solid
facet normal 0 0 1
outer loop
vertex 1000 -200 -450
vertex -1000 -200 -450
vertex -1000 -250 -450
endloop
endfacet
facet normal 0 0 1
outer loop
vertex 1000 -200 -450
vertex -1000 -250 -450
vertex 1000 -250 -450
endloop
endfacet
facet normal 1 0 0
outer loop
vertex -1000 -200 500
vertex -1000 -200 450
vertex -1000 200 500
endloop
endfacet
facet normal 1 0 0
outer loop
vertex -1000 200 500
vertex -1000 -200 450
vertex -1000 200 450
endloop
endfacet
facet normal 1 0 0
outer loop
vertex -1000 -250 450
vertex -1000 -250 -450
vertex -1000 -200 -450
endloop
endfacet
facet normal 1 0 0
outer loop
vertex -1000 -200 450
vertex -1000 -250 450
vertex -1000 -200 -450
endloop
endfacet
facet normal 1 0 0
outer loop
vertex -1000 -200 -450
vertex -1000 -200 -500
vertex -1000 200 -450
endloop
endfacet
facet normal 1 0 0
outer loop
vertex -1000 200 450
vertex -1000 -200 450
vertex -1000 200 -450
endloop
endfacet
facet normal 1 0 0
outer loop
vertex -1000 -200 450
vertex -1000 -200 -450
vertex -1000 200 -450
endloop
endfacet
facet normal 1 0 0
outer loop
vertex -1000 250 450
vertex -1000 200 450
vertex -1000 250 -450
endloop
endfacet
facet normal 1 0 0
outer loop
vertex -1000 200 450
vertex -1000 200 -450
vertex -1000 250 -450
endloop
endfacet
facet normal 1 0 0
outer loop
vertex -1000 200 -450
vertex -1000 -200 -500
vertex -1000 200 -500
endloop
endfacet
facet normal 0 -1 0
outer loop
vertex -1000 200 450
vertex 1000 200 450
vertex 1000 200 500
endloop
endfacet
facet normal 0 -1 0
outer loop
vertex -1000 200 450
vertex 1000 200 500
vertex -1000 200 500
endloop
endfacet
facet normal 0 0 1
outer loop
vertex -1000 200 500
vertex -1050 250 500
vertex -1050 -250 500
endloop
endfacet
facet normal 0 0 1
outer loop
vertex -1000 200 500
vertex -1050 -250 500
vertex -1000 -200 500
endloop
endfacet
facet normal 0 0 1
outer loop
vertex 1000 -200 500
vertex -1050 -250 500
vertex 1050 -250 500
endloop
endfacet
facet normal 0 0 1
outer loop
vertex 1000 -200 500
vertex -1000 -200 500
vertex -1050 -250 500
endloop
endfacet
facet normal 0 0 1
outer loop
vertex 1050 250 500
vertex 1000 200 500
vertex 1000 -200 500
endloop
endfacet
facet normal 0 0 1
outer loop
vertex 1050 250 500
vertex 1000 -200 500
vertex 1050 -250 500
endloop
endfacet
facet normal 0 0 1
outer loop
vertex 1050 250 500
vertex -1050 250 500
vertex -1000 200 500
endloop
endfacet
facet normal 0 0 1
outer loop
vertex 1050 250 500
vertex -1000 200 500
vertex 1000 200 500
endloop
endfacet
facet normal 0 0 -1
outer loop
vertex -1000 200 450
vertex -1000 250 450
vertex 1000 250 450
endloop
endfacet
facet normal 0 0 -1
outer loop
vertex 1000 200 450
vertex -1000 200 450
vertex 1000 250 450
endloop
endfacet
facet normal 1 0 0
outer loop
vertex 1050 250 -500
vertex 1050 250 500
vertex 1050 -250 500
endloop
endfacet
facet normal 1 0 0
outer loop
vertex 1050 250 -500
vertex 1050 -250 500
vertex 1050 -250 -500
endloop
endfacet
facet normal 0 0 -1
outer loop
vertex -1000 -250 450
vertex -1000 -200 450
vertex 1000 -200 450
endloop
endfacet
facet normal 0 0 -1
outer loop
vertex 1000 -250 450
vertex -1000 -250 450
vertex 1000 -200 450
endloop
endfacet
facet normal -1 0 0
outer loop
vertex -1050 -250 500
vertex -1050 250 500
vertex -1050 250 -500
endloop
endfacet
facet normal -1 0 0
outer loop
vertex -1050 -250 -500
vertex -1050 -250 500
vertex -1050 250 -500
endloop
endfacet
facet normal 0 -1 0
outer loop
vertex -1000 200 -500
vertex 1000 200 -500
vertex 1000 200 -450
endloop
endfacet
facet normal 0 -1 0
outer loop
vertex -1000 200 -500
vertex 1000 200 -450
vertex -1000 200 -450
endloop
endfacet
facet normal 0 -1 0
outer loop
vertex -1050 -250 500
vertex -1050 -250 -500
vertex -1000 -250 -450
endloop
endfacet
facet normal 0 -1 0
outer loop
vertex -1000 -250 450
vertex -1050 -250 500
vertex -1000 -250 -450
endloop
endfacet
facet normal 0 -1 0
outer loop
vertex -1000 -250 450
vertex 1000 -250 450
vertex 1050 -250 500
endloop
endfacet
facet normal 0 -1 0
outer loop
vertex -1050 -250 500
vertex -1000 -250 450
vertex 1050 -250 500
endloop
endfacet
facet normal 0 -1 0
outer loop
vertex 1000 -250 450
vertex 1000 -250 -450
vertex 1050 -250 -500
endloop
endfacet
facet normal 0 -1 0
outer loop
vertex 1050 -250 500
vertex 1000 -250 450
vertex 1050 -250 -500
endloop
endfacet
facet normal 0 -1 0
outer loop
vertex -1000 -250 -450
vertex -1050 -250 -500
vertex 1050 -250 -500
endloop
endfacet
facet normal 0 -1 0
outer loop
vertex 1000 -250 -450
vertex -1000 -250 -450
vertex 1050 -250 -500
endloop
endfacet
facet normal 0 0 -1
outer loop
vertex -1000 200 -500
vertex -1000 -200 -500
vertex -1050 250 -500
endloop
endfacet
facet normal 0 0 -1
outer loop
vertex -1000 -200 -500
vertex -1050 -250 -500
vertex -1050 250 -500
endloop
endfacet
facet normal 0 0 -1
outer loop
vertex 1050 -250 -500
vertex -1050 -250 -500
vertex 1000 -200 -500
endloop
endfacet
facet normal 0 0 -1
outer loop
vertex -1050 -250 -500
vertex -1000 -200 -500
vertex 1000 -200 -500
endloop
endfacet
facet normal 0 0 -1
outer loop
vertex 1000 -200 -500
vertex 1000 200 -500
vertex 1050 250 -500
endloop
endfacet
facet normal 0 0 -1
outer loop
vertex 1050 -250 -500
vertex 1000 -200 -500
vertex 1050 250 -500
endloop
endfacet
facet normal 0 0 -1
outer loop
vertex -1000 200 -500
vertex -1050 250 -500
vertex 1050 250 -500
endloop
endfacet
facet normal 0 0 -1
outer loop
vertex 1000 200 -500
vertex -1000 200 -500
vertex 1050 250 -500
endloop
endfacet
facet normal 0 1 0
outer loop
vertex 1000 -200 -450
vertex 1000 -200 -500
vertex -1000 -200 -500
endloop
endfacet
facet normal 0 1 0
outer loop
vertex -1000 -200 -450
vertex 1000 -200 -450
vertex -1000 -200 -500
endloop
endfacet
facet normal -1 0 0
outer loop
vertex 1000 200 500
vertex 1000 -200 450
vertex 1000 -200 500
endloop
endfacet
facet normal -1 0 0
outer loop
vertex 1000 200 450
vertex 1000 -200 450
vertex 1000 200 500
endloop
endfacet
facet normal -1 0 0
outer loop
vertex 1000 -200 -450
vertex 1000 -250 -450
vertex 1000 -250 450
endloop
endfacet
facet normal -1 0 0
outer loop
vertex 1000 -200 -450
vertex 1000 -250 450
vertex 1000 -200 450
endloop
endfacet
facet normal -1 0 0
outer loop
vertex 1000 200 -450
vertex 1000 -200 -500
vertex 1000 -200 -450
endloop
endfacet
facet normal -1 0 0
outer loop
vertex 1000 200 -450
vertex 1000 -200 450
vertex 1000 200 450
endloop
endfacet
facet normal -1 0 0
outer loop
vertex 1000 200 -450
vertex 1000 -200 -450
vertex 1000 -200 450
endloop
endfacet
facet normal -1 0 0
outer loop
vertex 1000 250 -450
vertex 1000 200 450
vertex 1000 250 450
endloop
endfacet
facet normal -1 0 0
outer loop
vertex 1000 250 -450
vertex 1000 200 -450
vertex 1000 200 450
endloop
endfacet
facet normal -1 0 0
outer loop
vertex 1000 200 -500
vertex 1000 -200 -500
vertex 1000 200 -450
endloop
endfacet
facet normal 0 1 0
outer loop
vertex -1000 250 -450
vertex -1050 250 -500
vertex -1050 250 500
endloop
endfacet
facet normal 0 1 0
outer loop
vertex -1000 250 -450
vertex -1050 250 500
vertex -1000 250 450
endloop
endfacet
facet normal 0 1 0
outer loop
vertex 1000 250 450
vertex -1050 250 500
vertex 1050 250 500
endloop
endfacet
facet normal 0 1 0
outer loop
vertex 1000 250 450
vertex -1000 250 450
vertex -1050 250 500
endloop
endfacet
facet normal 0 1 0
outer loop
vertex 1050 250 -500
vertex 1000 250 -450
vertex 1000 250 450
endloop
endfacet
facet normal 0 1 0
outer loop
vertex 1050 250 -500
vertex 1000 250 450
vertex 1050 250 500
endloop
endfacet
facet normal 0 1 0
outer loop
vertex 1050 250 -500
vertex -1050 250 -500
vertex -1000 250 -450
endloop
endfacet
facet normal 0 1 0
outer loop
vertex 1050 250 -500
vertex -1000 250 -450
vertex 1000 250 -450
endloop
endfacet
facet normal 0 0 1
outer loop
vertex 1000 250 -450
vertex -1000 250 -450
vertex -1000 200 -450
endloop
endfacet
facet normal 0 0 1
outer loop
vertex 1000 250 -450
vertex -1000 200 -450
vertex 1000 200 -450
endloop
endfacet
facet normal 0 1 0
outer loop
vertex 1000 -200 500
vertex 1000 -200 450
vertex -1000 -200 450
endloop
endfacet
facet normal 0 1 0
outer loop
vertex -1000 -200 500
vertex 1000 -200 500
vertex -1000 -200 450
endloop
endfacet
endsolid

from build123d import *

# Parameters (mm, degrees)
SKETCH1_W           = 2100
SKETCH1_H           = 1000
BOSS_EXTRUDE1_DEPTH = 250
CUT_EXTRUDE1_REACH  = 502
SKETCH2_W           = 2000
SKETCH2_H           = 900
SKETCH3_W           = 2000
SKETCH3_H           = 400
CUT_EXTRUDE2_DEPTH  = 1206


with BuildPart() as part:
    # Sketch1 → Boss-Extrude1 (new body, symmetric)
    with BuildSketch(Plane(origin=(0, 0, 0), x_dir=(1, 0, 0), z_dir=(0, 1, 0))):
        Rectangle(SKETCH1_W, SKETCH1_H)
    extrude(amount=BOSS_EXTRUDE1_DEPTH, both=True)

    # Sketch2 → Cut-Extrude1 (cut, up to next)
    with BuildSketch(Plane(origin=(0, 250, 0), x_dir=(1, 0, 0), z_dir=(0, 1, 0)), mode=Mode.PRIVATE) as cut_extrude1_sk1:
        Rectangle(SKETCH2_W, SKETCH2_H)
    cut_extrude1_tool1 = extrude(cut_extrude1_sk1.sketch, amount=-CUT_EXTRUDE1_REACH, mode=Mode.PRIVATE) & part.part
    add(cut_extrude1_tool1.solids().sort_by_distance((0, 250, 0))[0], mode=Mode.SUBTRACT)

    # Sketch3 → Cut-Extrude2 (cut)
    with BuildSketch(Plane(origin=(0, 0, -500), x_dir=(-1, 0, 0), z_dir=(0, 0, -1))):
        Rectangle(SKETCH3_W, SKETCH3_H)
    extrude(amount=-CUT_EXTRUDE2_DEPTH, mode=Mode.SUBTRACT)


solid = part.part
